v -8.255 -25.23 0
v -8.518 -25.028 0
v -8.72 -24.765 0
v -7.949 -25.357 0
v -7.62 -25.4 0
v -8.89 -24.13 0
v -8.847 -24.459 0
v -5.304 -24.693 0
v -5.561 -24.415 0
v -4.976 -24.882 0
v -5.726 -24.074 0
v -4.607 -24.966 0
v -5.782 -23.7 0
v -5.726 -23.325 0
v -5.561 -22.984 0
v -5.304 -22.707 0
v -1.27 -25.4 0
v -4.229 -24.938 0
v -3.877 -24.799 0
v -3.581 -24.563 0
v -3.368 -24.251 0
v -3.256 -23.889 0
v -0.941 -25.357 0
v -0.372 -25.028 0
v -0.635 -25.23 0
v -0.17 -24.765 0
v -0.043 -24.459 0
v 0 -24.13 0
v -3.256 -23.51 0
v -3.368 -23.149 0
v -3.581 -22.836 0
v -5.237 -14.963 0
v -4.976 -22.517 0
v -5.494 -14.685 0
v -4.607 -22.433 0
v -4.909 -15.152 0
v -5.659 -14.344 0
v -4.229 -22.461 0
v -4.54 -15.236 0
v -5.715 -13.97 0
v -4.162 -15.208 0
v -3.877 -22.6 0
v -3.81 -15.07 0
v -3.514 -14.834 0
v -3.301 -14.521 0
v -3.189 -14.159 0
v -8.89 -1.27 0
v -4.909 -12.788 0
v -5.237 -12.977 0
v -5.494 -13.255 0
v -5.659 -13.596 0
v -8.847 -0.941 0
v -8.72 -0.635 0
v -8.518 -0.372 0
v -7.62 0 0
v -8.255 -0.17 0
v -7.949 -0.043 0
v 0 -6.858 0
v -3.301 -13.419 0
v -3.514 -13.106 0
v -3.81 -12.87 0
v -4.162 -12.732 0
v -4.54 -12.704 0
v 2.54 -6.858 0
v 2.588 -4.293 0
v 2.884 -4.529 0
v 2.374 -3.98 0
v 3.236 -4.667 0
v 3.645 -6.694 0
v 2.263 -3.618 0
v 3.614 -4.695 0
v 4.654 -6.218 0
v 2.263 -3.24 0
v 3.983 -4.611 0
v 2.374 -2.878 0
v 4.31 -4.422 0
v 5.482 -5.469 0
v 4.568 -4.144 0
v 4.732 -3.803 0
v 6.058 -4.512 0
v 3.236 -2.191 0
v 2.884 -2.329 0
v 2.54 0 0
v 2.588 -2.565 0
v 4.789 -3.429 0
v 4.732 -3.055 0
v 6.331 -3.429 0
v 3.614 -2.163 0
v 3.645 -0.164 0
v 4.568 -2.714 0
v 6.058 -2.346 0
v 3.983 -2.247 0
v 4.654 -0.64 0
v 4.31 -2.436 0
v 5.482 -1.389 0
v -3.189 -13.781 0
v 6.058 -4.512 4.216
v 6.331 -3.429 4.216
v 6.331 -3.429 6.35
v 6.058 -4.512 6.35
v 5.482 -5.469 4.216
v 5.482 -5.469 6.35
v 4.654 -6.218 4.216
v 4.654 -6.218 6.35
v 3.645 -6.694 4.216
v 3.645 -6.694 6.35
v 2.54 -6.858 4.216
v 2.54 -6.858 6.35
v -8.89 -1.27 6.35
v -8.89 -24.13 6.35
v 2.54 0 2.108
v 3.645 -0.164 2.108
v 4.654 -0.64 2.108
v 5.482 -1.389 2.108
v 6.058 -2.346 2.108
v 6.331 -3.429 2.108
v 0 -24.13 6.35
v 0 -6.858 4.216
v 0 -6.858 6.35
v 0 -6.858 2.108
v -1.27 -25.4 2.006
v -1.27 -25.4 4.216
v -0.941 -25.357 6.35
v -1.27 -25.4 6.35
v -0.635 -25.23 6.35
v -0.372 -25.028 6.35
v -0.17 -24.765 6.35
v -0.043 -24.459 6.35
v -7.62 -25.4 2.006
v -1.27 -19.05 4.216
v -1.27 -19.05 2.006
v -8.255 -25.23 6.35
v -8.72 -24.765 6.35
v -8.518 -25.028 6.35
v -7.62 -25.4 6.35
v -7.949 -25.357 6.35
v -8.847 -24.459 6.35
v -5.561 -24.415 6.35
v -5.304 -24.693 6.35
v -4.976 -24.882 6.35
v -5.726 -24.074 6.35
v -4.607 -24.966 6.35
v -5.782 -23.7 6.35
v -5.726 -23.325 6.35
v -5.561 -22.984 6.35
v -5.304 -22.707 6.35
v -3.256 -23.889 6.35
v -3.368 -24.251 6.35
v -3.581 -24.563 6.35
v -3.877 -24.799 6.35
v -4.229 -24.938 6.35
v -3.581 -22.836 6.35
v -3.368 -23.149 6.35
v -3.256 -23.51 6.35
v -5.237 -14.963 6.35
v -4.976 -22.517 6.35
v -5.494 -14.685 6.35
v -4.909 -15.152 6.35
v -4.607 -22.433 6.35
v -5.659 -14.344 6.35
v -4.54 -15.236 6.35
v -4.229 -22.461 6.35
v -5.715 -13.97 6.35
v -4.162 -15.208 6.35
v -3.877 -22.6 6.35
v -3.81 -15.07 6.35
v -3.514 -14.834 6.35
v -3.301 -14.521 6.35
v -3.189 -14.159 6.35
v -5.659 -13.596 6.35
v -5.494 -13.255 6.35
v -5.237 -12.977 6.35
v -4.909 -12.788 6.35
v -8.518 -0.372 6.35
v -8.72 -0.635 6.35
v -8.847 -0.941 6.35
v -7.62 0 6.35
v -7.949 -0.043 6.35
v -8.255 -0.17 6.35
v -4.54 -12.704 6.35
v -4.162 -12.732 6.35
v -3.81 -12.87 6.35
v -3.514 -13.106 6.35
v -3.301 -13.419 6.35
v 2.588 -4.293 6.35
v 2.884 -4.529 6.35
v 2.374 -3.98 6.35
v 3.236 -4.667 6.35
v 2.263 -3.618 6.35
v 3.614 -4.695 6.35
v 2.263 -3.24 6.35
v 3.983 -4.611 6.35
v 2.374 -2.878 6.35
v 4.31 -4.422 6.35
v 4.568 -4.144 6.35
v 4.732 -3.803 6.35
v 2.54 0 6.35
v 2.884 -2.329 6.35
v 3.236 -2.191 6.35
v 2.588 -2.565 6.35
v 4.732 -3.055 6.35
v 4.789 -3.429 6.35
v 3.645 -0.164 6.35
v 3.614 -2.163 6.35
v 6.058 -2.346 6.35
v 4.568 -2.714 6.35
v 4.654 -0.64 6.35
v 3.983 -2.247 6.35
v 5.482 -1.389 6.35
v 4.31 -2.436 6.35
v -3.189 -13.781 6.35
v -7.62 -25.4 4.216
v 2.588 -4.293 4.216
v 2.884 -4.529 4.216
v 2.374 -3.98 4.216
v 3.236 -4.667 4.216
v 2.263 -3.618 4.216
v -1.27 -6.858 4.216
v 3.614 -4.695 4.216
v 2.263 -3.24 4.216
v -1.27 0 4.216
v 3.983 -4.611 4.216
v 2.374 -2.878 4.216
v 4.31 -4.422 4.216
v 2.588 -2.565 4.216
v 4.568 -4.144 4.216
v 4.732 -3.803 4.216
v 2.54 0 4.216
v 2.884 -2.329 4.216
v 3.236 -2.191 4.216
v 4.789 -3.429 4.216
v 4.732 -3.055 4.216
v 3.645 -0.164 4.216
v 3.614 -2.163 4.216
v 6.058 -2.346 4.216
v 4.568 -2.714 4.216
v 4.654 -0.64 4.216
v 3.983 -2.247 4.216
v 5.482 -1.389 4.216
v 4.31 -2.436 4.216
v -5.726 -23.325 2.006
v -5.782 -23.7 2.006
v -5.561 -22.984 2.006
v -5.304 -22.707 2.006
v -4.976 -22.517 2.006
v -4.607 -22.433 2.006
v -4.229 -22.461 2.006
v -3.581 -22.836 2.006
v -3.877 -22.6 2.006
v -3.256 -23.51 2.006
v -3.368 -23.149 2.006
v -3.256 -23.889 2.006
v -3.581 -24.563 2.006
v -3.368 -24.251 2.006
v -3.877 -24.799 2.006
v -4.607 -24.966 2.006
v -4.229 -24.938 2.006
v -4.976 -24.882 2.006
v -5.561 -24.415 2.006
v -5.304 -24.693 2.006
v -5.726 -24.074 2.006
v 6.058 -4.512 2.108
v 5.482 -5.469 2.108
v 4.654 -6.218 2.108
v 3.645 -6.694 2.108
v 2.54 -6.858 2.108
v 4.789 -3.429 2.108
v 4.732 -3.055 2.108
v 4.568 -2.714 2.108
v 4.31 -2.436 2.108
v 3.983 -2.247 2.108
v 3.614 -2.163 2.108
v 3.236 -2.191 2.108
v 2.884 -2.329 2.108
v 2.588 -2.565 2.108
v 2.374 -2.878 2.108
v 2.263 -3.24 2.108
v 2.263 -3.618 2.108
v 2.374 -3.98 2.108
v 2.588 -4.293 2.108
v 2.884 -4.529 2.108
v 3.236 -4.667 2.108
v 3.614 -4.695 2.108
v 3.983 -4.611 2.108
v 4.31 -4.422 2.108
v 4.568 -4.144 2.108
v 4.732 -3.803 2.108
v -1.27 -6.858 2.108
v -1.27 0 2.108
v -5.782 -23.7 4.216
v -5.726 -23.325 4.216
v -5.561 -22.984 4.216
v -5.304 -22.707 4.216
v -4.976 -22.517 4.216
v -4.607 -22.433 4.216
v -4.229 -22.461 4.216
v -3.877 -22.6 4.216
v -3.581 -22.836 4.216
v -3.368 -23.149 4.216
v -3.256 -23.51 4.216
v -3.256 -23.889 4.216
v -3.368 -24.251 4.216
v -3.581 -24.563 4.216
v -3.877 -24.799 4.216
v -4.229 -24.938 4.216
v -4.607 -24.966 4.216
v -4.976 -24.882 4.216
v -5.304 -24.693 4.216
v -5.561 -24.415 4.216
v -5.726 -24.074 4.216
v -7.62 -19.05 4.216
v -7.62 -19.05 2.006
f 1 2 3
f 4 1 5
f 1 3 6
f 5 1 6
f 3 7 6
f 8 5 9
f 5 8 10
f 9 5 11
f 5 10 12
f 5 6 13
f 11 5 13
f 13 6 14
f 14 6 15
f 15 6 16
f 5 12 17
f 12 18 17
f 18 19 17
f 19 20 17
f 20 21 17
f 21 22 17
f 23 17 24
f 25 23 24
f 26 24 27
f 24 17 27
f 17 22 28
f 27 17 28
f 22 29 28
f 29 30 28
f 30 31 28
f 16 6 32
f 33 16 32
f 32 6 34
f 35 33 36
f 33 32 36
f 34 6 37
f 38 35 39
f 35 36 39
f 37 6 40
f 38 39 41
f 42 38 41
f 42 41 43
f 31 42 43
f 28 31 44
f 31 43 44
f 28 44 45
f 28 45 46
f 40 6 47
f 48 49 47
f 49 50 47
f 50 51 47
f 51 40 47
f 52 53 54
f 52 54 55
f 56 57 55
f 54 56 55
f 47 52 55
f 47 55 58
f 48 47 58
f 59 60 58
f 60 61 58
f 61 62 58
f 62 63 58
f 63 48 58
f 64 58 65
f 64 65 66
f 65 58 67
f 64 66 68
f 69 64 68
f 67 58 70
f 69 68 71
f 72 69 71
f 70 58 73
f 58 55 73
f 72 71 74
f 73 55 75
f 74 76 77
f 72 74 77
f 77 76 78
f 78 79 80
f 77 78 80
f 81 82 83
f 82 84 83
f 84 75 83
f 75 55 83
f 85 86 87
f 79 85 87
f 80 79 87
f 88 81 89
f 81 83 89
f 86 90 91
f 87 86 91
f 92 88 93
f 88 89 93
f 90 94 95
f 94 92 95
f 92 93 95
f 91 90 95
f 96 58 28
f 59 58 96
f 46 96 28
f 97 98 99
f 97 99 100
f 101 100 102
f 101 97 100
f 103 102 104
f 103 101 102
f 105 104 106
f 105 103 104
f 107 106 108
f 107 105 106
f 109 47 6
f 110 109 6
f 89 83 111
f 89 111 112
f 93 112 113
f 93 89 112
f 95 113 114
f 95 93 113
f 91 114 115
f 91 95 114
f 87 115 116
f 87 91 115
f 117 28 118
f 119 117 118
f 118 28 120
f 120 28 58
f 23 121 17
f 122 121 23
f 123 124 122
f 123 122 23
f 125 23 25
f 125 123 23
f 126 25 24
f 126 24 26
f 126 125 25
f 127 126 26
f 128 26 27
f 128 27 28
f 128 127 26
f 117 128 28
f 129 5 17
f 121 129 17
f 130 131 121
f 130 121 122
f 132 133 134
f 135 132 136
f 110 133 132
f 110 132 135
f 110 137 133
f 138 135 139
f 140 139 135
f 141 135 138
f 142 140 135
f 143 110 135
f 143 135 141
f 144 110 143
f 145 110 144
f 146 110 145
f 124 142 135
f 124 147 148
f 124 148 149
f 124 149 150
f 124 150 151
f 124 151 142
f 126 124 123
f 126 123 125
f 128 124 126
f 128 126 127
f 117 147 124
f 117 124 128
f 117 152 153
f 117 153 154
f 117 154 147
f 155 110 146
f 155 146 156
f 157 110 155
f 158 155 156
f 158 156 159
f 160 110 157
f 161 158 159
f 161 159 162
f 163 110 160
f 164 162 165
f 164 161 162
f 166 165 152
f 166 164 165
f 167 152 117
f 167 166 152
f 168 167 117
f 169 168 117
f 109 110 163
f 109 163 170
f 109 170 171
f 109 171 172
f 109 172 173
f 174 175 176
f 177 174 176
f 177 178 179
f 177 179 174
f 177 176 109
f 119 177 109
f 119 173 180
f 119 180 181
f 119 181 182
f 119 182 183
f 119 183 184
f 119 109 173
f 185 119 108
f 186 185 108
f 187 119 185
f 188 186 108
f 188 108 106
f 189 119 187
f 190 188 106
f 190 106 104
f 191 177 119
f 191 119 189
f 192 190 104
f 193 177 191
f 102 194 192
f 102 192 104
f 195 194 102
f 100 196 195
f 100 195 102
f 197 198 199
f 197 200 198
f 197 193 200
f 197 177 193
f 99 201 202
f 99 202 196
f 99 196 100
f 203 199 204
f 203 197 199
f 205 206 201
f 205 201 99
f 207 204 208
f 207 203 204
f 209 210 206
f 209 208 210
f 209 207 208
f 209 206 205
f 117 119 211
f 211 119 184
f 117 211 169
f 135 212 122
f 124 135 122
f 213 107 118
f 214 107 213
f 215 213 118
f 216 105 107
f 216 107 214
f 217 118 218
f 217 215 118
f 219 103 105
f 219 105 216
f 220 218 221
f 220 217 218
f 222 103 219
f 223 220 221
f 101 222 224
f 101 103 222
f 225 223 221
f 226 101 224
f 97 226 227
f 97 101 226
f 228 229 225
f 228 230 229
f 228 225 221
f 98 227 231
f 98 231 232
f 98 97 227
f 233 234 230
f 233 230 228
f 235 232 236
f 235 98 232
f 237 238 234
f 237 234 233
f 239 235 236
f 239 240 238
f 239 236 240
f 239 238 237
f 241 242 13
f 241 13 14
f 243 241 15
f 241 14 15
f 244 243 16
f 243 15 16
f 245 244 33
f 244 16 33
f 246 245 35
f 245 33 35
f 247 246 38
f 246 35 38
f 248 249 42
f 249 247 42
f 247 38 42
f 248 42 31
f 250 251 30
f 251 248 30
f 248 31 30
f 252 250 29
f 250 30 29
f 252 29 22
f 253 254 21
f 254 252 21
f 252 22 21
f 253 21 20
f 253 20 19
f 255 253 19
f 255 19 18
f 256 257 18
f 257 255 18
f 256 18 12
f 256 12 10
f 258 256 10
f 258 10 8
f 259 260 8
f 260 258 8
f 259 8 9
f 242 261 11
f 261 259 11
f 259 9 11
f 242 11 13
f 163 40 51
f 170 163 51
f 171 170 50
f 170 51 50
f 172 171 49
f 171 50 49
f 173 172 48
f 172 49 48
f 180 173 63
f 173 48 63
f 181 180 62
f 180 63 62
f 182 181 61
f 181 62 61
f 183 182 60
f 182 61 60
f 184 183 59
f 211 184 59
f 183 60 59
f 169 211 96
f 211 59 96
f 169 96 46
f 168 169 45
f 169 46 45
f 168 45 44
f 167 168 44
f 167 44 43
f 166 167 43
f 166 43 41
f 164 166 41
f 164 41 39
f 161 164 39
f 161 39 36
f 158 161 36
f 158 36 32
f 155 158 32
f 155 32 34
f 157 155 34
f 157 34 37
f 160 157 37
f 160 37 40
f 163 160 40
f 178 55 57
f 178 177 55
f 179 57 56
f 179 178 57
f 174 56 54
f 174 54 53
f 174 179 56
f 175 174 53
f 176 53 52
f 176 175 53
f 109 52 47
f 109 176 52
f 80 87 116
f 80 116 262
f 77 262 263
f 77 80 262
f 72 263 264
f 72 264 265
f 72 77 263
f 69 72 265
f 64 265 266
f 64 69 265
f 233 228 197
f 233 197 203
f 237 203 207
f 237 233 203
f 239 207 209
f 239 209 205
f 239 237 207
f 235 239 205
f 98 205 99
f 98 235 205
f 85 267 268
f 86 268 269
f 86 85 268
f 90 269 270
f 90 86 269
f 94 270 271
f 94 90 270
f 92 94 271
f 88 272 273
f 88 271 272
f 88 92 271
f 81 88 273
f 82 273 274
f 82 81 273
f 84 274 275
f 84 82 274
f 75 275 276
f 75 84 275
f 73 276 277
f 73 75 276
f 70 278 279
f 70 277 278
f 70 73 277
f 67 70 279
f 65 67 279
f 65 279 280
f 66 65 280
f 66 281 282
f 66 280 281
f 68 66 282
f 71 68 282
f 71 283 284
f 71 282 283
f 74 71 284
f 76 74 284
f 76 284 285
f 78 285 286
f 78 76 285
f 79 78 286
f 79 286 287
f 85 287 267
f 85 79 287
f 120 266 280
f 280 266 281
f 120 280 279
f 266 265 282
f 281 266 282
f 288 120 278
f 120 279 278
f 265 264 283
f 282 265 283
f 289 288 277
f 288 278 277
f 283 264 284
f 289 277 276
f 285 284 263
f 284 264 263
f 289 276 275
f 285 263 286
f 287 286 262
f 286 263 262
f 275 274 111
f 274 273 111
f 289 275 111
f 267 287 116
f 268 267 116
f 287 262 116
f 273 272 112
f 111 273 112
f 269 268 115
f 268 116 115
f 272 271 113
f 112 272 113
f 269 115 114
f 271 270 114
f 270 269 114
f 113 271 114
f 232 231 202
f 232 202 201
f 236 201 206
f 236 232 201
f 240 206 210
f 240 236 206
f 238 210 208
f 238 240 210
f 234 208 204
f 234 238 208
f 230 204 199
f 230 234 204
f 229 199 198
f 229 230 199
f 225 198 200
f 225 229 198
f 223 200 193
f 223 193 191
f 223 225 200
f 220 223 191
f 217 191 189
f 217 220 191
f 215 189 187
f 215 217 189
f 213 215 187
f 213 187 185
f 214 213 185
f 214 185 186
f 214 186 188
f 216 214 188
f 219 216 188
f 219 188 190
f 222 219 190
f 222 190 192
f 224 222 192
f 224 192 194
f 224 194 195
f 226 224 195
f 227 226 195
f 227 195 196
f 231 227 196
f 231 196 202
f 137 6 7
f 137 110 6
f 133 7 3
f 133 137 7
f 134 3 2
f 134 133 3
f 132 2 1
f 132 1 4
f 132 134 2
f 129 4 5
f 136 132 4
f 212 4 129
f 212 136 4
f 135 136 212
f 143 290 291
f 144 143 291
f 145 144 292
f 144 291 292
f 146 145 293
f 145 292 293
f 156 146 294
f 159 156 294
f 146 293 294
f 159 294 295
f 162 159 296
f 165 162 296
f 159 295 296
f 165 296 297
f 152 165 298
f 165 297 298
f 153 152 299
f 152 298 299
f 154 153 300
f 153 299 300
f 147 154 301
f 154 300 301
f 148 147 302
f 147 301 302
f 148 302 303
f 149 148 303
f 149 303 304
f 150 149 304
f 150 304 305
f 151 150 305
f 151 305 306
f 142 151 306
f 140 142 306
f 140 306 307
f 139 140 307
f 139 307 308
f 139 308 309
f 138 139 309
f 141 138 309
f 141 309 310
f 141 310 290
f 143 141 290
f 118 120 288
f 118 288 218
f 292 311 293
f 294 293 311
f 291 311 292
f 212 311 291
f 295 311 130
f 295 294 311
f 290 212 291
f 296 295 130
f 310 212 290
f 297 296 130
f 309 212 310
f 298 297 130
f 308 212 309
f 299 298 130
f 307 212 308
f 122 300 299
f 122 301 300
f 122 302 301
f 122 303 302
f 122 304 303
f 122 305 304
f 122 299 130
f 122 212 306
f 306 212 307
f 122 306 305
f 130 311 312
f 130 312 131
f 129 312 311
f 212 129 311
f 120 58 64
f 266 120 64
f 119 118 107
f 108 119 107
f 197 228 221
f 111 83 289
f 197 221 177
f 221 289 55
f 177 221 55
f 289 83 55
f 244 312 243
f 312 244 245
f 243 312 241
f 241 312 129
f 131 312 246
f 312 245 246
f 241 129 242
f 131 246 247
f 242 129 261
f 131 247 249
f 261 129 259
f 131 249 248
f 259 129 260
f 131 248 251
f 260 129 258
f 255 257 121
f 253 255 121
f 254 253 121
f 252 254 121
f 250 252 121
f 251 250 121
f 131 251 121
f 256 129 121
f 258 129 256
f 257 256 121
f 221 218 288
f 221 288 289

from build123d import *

# Parameters (mm, degrees)
F0_R            = 1.27
F1_DEPTH        = 6.35
F3_W            = 6.858
F3_H            = 2.1082
F4_DEPTH        = 7.62
F5_R            = 1.27
F6_W            = 6.35
F6_H            = 2.2097155452
F7_DEPTH        = 6.35
F9_D            = 2.54
F9_CBORE_D      = 2.54
F9_CBORE_DEPTH  = 6.35
F11_D           = 2.54
F11_CBORE_D     = 2.54
F11_CBORE_DEPTH = 6.35
F12_T1_DEPTH    = 21.1836
F12_T3_DEPTH    = 21.1582


# Not quite as in the source:
# - a fillet or chamfer that OpenCascade refuses, or shapes differently, is made with other operations: its cross-section is extruded or revolved along the edge and cut away or added


with BuildPart() as f1:
    # F0 (on Top) → F1 (new body)
    with BuildSketch(Plane.XY):
        Polygon((6.35, 0), (0, 0), (-8.89, 0), (-8.89, -6.858), (-8.89, -25.4), (0, -25.4), (0, -6.858), (6.35, -6.858), align=None)
        with Locations((3.5186004825, -3.429)):
            Circle(F0_R, mode=Mode.SUBTRACT)
    extrude(amount=F1_DEPTH)

    # F3 (on face) → F4 (cut)
    with BuildSketch(Plane.YZ.offset(6.35)):
        with Locations((-3.429, 3.1623)):
            Rectangle(F3_W, F3_H)
    extrude(amount=-F4_DEPTH, mode=Mode.SUBTRACT)

    # F5
    f5_edges = [f1.edges().sort_by_distance(p)[0] for p in [
        (0, -25.4, 3.175),
        (-8.89, -25.4, 3.175),
        (-8.89, 0, 3.175),
    ]]
    fillet(f5_edges, radius=F5_R)

    # F6 (on face) → F7 (cut)
    with BuildSketch(Plane.XZ.offset(25.4)):
        with Locations((-4.445, 3.1112665311)):
            Rectangle(F6_W, F6_H)
    extrude(amount=-F7_DEPTH, mode=Mode.SUBTRACT)

    # F9 (through all)
    with Locations(Plane.XY.offset(6.35)):
        with Locations((-4.5120492578, -23.6996337771)):
            CounterBoreHole(F9_D / 2, F9_CBORE_D / 2, F9_CBORE_DEPTH)

    # F11 (through all)
    with Locations(Plane.XY.offset(6.35)):
        with Locations((-4.445, -13.97)):
            CounterBoreHole(F11_D / 2, F11_CBORE_D / 2, F11_CBORE_DEPTH)

    # F12: fillet of radius 3.81 on 4 edges, made by hand

    # F12_s2 → F12_t1 (cut)
    with BuildSketch(Plane.XY.offset(-5.3086)):
        with BuildLine():
            ThreePointArc((6.35, -3.048), (5.2340768363, -5.7420768363), (2.54, -6.858))
            Line((2.54, -6.858), (6.35, -6.858))
            Line((6.35, -6.858), (6.35, -3.048))
        make_face()
        with BuildLine():
            ThreePointArc((2.54, 0), (5.2340768363, -1.1159231637), (6.35, -3.81))
            Line((6.35, -3.81), (6.35, 0))
            Line((6.35, 0), (2.54, 0))
        make_face()
    extrude(amount=F12_T1_DEPTH, mode=Mode.SUBTRACT)

    # F12_s4 → F12_t3 (cut)
    with BuildSketch(Plane.XY.offset(-9.525)):
        with BuildLine():
            ThreePointArc((6.35, -3.048), (5.2340768363, -5.7420768363), (2.54, -6.858))
            Line((2.54, -6.858), (6.35, -6.858))
            Line((6.35, -6.858), (6.35, -3.048))
        make_face()
        with BuildLine():
            ThreePointArc((2.54, 0), (5.2340768363, -1.1159231637), (6.35, -3.81))
            Line((6.35, -3.81), (6.35, 0))
            Line((6.35, 0), (2.54, 0))
        make_face()
    extrude(amount=F12_T3_DEPTH, mode=Mode.SUBTRACT)


solid = f1.part
